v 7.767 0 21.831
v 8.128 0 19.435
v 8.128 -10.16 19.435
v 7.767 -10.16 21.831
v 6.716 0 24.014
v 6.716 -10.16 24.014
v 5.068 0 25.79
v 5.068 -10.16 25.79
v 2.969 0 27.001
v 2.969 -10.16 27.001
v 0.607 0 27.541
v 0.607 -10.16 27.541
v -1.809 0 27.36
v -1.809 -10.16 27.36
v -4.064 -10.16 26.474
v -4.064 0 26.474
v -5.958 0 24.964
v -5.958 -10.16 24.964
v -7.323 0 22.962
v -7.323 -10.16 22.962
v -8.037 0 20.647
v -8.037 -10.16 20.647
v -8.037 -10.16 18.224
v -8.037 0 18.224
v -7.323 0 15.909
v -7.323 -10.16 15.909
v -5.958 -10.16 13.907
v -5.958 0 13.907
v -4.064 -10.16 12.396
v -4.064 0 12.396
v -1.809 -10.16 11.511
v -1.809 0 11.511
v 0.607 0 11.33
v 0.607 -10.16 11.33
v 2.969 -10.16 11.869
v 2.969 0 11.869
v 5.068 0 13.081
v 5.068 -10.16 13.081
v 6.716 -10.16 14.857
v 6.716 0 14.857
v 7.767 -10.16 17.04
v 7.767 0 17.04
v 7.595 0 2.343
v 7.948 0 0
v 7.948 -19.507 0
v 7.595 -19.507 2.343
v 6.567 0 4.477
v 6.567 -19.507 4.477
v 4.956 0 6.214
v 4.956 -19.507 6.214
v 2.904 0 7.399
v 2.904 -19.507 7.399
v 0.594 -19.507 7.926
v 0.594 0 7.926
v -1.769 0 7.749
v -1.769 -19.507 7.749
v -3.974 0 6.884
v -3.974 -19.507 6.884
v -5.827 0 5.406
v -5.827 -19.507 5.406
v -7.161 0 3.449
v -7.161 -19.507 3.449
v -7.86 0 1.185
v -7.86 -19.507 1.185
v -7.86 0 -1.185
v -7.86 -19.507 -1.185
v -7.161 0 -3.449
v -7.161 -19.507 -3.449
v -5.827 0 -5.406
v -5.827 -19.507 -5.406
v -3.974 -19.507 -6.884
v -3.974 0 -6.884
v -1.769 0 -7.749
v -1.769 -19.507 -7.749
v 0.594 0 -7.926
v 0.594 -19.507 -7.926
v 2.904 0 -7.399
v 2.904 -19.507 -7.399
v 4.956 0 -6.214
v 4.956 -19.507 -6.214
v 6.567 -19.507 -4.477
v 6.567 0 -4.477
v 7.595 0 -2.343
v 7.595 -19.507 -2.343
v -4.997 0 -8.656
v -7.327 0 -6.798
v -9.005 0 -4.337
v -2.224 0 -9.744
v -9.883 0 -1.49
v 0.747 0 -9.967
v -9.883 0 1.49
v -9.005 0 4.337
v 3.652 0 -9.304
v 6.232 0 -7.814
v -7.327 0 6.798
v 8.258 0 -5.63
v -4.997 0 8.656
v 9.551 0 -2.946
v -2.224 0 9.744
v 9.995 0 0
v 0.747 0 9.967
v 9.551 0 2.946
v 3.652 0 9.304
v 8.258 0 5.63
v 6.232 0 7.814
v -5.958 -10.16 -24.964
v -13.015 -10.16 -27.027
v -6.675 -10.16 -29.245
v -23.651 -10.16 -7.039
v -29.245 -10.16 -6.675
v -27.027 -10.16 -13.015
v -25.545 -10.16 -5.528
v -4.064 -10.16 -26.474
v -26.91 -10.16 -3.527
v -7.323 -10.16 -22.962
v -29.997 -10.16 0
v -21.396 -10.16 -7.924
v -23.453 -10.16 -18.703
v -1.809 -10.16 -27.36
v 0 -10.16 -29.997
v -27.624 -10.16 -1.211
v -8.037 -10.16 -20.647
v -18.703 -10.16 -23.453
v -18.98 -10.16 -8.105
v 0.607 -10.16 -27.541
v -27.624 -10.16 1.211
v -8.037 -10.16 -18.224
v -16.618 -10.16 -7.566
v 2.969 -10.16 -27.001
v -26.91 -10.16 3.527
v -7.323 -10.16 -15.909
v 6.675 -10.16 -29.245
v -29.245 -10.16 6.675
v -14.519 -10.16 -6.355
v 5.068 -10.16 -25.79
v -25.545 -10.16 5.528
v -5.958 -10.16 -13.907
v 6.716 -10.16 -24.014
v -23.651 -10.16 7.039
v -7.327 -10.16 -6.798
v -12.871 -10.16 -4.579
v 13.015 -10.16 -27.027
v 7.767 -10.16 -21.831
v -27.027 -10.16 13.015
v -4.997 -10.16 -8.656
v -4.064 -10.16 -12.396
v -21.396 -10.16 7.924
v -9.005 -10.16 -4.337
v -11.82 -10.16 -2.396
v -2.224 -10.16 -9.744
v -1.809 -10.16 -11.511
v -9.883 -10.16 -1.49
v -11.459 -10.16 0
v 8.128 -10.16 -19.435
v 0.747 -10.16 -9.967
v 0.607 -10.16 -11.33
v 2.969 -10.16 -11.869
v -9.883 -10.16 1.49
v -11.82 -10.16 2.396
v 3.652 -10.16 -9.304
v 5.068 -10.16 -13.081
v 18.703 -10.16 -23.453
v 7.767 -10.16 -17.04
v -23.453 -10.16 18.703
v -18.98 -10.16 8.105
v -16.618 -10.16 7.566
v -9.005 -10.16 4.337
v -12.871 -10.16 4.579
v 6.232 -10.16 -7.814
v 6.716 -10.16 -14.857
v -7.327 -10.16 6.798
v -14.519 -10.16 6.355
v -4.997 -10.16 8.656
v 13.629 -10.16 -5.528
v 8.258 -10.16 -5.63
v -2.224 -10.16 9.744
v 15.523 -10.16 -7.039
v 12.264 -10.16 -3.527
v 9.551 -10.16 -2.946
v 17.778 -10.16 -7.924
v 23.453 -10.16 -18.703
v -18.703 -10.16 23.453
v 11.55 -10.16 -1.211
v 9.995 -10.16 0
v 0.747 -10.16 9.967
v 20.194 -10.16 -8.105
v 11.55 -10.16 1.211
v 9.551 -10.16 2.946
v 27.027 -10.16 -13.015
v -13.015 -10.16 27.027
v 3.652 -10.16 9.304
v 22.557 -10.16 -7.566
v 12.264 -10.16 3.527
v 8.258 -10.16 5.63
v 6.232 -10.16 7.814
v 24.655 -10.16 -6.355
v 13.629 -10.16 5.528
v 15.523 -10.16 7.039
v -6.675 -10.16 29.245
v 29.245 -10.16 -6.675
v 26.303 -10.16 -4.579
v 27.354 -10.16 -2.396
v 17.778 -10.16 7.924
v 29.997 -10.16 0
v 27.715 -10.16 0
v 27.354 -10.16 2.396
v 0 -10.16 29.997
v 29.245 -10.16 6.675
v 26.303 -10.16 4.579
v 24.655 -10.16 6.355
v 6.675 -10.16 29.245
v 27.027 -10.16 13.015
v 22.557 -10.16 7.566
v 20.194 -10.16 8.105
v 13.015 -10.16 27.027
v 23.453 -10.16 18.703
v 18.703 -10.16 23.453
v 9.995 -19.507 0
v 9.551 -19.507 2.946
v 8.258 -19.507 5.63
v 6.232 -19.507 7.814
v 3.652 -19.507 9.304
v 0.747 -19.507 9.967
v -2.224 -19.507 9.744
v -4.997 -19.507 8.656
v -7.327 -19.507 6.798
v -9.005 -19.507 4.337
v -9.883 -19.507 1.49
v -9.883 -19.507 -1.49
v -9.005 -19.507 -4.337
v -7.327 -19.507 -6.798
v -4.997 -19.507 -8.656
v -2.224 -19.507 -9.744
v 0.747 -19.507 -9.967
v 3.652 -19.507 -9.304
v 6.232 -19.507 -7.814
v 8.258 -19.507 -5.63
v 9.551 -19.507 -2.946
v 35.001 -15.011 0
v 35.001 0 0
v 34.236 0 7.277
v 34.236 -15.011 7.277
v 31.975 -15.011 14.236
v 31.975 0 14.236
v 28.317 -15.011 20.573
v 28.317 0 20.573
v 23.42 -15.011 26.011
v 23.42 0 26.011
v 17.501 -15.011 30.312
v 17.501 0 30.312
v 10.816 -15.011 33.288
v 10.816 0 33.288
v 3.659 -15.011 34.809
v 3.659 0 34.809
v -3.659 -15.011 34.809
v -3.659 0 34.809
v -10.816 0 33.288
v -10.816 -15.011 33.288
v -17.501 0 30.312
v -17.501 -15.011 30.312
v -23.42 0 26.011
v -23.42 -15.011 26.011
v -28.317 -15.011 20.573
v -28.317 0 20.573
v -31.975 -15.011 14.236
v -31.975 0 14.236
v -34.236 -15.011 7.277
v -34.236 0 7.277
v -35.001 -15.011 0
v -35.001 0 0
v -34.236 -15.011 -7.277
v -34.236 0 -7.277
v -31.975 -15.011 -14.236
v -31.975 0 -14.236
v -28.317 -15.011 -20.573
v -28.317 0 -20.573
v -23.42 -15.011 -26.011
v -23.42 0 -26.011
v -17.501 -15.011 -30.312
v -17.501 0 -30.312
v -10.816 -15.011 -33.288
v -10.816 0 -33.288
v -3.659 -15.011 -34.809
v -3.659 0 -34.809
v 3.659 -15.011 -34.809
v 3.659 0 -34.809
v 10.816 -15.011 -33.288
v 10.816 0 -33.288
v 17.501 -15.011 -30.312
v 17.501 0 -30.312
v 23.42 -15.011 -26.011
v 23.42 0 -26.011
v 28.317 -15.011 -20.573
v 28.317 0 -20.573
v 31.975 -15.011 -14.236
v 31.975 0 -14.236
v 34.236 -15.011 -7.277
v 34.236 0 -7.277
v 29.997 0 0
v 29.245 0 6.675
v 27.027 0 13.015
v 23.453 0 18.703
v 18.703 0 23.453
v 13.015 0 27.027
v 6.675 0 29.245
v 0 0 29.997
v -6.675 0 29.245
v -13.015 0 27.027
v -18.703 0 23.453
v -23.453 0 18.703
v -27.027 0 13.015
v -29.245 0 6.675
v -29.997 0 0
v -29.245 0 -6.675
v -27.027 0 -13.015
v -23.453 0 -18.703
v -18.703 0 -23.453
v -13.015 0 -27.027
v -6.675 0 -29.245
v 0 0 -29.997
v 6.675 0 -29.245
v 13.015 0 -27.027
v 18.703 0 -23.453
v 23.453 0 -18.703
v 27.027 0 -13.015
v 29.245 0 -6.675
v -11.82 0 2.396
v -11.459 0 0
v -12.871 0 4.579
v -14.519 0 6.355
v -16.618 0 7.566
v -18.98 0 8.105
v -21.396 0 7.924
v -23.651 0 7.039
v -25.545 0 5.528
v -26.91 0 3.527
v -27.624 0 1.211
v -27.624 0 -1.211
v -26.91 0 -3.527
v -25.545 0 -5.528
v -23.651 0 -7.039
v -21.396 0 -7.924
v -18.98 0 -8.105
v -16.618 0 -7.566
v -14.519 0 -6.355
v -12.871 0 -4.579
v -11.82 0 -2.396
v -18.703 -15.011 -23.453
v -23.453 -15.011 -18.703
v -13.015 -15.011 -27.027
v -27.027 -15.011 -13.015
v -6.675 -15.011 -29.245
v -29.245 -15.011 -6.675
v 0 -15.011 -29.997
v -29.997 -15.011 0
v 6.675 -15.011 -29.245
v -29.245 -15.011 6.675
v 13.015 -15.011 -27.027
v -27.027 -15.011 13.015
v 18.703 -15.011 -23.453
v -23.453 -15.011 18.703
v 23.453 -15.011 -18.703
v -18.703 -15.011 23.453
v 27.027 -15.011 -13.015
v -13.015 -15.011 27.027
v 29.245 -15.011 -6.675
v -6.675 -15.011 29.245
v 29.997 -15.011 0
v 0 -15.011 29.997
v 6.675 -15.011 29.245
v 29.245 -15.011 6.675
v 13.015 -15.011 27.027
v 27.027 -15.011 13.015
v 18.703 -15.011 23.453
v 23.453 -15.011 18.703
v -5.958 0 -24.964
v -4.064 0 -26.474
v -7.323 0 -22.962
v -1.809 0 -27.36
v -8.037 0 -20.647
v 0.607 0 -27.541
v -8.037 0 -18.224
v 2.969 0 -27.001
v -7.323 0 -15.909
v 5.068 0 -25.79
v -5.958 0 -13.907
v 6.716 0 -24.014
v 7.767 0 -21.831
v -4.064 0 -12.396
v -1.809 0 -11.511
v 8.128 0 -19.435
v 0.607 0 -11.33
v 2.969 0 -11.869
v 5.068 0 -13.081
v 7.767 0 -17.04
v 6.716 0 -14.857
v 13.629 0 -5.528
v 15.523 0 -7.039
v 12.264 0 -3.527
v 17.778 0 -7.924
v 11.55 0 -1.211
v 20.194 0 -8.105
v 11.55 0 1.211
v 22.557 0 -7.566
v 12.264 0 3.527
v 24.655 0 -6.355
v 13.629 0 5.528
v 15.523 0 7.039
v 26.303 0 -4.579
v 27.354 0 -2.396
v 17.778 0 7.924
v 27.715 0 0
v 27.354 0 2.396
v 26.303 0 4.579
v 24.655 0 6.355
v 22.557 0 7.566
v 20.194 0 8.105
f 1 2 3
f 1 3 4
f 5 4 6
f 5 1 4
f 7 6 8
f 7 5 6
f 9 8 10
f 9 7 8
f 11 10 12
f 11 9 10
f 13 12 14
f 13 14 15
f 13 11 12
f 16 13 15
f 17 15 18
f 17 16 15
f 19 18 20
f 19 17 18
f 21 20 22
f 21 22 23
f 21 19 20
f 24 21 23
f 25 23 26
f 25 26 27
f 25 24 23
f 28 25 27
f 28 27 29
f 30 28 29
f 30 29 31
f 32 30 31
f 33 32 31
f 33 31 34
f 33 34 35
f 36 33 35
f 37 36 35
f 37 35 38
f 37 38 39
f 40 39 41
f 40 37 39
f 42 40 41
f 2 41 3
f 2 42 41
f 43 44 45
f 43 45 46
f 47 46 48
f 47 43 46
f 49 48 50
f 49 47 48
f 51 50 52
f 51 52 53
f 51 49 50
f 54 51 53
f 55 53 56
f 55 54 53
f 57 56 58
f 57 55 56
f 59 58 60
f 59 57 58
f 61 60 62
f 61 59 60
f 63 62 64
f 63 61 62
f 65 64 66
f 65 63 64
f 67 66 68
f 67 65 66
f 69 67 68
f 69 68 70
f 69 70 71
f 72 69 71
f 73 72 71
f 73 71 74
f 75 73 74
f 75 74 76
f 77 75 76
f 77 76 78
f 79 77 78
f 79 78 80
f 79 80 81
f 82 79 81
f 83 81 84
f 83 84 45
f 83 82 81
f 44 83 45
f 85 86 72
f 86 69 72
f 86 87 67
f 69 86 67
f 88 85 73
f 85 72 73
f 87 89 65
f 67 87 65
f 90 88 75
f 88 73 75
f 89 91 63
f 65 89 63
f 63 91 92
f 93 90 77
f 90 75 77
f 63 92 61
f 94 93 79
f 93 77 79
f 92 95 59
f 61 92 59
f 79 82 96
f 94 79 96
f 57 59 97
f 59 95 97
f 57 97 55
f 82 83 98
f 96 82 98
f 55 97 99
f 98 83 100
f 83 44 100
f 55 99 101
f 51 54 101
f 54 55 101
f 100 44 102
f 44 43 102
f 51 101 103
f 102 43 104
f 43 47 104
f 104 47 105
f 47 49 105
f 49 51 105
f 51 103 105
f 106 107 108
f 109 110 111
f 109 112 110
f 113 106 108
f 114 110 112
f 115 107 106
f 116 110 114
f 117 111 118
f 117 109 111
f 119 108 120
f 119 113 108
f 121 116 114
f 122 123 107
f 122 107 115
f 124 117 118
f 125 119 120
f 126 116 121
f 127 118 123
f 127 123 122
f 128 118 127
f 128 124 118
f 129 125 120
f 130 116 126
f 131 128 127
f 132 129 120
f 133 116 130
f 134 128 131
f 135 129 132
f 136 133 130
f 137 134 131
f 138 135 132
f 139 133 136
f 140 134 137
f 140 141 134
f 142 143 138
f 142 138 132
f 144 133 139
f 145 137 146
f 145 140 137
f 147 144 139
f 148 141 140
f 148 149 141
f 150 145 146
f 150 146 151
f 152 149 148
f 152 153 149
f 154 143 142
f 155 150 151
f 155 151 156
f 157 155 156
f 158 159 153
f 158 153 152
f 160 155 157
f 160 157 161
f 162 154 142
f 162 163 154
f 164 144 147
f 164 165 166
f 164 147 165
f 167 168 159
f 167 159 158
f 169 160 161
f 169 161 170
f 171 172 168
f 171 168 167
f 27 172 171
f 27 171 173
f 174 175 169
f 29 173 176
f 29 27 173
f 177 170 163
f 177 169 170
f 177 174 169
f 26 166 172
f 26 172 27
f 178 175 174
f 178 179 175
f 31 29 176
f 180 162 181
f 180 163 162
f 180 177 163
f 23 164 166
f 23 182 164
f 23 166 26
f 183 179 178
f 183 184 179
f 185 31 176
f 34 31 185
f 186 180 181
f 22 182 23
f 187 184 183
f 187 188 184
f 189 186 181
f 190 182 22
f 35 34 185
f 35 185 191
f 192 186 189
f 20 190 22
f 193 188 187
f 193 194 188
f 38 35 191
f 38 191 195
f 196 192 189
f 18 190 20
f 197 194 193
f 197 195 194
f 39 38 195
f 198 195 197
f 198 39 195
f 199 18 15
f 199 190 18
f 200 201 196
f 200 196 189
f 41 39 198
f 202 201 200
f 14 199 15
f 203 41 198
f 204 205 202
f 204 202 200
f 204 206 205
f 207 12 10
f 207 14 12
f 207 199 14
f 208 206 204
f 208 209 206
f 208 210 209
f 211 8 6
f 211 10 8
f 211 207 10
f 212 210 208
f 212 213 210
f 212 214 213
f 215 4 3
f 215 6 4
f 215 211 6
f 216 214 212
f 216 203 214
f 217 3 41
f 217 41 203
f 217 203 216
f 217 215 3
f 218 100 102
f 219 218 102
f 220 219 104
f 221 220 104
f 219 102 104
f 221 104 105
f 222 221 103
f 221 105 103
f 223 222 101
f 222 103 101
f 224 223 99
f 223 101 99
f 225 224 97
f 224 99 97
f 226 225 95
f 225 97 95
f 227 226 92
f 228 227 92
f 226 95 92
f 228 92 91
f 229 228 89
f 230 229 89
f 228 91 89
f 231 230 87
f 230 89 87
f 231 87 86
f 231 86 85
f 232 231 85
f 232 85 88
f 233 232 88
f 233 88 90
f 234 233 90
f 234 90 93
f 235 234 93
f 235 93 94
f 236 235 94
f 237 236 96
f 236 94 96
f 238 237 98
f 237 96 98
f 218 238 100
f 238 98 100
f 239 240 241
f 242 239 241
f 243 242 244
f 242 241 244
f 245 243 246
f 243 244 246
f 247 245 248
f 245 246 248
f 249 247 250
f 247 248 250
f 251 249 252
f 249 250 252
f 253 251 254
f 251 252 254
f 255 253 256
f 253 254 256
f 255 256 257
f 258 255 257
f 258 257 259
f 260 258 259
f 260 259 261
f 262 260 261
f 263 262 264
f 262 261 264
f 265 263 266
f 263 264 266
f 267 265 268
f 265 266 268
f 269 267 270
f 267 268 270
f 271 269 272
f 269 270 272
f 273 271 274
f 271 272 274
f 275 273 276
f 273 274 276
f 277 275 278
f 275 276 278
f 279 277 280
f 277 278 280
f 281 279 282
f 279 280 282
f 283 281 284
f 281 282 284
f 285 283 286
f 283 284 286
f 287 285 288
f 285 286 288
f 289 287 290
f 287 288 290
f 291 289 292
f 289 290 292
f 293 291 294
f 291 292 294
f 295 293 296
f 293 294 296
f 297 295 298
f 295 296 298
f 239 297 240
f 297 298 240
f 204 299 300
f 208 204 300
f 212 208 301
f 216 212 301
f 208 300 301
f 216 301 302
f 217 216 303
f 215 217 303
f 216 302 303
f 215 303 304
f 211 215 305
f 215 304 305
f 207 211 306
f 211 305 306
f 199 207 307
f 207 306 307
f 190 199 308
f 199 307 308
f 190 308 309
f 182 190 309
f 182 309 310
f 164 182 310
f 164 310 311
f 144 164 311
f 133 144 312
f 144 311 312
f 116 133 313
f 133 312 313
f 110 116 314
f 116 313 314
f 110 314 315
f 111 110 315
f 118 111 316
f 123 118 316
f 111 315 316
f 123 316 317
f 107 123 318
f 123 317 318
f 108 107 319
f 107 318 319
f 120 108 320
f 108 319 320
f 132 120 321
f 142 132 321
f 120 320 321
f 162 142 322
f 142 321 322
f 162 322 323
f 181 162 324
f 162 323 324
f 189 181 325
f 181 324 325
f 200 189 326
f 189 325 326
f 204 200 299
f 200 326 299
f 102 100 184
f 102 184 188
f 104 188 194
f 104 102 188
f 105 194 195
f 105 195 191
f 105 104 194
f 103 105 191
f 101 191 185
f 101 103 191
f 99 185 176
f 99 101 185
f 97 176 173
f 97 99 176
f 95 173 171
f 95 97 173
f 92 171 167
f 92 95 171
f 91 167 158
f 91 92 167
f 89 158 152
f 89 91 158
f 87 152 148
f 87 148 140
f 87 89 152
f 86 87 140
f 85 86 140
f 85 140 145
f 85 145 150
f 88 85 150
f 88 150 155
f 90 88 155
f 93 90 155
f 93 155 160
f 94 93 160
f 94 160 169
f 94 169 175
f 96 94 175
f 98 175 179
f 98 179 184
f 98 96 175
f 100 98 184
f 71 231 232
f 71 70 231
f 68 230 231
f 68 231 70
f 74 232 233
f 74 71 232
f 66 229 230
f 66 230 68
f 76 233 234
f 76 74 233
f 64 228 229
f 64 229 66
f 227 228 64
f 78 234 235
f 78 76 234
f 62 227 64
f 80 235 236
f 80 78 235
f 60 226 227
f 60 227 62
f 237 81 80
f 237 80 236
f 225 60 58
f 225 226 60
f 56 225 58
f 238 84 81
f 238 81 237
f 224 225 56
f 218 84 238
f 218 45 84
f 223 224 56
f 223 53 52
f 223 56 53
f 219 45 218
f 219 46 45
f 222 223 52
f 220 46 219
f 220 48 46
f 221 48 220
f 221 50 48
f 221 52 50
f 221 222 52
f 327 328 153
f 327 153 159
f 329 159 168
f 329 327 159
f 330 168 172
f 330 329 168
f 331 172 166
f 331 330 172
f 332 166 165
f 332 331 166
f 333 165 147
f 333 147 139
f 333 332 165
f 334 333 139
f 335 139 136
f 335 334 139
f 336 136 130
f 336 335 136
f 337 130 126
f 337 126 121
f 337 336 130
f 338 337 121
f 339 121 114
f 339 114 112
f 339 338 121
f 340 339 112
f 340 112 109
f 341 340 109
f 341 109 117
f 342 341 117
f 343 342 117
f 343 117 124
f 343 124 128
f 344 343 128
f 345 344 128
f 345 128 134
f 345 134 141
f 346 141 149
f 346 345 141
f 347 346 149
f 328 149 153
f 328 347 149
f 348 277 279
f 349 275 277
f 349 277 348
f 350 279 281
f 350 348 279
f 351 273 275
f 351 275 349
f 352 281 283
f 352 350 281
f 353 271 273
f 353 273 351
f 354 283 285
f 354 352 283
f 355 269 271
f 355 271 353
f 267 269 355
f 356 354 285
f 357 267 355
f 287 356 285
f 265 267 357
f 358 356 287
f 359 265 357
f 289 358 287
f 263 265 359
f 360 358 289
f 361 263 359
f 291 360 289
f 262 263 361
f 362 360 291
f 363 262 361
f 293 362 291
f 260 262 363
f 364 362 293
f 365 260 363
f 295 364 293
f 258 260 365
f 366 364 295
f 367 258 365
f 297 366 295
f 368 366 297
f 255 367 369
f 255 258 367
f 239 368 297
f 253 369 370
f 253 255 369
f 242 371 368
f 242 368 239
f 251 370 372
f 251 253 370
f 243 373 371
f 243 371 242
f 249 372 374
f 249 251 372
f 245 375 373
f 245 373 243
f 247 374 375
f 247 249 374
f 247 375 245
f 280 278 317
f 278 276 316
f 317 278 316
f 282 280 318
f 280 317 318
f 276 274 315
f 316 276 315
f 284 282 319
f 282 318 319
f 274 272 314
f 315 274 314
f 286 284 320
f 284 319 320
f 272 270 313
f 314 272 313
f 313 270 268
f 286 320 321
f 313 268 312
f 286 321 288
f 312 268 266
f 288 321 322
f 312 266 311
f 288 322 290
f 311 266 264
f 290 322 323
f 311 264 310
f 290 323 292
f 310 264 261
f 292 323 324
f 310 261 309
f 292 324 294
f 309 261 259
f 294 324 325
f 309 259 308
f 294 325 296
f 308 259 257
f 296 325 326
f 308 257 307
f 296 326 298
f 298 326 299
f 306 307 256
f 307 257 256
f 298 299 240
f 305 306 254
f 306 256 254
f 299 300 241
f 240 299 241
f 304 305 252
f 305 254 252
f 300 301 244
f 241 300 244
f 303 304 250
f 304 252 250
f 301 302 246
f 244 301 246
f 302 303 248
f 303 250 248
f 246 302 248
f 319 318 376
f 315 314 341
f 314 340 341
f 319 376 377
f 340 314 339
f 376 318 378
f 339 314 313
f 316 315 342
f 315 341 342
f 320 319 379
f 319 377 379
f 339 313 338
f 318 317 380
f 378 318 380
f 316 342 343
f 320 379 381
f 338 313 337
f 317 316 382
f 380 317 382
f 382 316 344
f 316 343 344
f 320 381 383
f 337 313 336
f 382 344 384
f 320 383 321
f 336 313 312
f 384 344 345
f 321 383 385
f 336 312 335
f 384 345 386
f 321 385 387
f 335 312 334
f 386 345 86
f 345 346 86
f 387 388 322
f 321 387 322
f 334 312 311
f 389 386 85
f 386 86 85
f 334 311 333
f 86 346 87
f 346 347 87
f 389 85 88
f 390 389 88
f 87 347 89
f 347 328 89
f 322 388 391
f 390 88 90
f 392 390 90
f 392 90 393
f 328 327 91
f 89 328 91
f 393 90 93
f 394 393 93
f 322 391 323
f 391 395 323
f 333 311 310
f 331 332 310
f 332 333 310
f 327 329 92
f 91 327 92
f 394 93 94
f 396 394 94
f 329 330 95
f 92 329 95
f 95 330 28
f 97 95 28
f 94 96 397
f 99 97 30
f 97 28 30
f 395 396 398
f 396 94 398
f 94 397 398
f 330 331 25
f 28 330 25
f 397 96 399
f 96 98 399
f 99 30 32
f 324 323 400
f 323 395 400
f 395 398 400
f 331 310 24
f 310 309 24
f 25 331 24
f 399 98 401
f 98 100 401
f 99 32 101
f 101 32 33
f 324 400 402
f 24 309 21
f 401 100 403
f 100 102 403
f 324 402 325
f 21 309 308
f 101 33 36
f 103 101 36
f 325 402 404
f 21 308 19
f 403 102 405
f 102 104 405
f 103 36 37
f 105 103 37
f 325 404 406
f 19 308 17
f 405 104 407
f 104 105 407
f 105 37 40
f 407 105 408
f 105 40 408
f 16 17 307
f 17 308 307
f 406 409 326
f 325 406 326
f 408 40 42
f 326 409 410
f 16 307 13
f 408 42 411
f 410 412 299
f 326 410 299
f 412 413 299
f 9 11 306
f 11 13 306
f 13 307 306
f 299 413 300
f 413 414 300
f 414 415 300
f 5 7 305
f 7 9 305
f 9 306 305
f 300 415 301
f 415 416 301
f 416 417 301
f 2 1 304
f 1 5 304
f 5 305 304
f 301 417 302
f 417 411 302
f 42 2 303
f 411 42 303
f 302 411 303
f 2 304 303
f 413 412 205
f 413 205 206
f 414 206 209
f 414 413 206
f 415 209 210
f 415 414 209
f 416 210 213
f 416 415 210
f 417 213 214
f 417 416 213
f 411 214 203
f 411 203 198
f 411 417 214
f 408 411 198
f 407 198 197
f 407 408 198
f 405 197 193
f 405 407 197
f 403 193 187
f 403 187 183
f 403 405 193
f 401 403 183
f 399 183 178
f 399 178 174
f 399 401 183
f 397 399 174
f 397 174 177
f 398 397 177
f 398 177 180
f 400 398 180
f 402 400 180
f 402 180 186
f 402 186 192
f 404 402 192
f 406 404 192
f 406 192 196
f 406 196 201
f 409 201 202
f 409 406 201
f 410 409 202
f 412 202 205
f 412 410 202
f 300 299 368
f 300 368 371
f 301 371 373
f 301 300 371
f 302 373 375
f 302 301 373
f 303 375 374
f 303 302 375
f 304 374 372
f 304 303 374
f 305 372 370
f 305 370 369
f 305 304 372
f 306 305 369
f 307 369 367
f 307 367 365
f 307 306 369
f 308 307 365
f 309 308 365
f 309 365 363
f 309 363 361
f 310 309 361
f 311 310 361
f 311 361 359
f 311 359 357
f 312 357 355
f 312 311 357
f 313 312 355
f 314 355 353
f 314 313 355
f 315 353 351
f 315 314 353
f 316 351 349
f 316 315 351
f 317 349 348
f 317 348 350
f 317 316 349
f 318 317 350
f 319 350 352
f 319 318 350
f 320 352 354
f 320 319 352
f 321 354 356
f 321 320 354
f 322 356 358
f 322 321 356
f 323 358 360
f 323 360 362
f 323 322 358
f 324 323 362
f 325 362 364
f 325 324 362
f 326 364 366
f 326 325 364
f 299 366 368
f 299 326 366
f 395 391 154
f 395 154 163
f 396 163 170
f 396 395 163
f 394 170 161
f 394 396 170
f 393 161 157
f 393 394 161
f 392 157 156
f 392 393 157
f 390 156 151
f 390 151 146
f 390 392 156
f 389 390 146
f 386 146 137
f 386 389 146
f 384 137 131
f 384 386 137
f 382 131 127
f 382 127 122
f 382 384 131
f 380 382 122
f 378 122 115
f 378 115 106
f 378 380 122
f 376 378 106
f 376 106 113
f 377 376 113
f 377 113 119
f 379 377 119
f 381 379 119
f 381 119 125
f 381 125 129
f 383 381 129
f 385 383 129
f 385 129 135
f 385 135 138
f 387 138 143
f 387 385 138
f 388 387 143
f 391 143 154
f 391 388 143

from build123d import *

# Parameters (mm, degrees)
F0_R     = 35.0012
F0_R_2   = 29.9974
F1_DEPTH = 15.0114
F0_R_3   = 9.9949
F0_R_4   = 7.948384
F2_DEPTH = 19.5072
F0_R_5   = 8.128
F3_DEPTH = 10.16


with BuildPart() as f1:
    # F0 (on Front) → F1 (new body)
    with BuildSketch(Plane.XZ):
        Circle(F0_R)
        Circle(F0_R_2, mode=Mode.SUBTRACT)
    extrude(amount=F1_DEPTH)


with BuildPart() as f2:
    # F0 (on Front) → F2 (new body)
    with BuildSketch(Plane.XZ):
        Circle(F0_R_3)
        Circle(F0_R_4, mode=Mode.SUBTRACT)
    extrude(amount=F2_DEPTH)


with BuildPart() as f3:
    # F0 (on Front) → F3 (new body)
    with BuildSketch(Plane.XZ):
        Circle(F0_R_2)
        with Locations((0, -19.435352)):
            Circle(F0_R_5, mode=Mode.SUBTRACT)
        with Locations((-19.58709, 0)):
            Circle(F0_R_5, mode=Mode.SUBTRACT)
        Circle(F0_R_3, mode=Mode.SUBTRACT)
        with Locations((19.58709, 0)):
            Circle(F0_R_5, mode=Mode.SUBTRACT)
        with Locations((0, 19.435352)):
            Circle(F0_R_5, mode=Mode.SUBTRACT)
    extrude(amount=F3_DEPTH)


solid = Compound([f1.part, f2.part, f3.part])
